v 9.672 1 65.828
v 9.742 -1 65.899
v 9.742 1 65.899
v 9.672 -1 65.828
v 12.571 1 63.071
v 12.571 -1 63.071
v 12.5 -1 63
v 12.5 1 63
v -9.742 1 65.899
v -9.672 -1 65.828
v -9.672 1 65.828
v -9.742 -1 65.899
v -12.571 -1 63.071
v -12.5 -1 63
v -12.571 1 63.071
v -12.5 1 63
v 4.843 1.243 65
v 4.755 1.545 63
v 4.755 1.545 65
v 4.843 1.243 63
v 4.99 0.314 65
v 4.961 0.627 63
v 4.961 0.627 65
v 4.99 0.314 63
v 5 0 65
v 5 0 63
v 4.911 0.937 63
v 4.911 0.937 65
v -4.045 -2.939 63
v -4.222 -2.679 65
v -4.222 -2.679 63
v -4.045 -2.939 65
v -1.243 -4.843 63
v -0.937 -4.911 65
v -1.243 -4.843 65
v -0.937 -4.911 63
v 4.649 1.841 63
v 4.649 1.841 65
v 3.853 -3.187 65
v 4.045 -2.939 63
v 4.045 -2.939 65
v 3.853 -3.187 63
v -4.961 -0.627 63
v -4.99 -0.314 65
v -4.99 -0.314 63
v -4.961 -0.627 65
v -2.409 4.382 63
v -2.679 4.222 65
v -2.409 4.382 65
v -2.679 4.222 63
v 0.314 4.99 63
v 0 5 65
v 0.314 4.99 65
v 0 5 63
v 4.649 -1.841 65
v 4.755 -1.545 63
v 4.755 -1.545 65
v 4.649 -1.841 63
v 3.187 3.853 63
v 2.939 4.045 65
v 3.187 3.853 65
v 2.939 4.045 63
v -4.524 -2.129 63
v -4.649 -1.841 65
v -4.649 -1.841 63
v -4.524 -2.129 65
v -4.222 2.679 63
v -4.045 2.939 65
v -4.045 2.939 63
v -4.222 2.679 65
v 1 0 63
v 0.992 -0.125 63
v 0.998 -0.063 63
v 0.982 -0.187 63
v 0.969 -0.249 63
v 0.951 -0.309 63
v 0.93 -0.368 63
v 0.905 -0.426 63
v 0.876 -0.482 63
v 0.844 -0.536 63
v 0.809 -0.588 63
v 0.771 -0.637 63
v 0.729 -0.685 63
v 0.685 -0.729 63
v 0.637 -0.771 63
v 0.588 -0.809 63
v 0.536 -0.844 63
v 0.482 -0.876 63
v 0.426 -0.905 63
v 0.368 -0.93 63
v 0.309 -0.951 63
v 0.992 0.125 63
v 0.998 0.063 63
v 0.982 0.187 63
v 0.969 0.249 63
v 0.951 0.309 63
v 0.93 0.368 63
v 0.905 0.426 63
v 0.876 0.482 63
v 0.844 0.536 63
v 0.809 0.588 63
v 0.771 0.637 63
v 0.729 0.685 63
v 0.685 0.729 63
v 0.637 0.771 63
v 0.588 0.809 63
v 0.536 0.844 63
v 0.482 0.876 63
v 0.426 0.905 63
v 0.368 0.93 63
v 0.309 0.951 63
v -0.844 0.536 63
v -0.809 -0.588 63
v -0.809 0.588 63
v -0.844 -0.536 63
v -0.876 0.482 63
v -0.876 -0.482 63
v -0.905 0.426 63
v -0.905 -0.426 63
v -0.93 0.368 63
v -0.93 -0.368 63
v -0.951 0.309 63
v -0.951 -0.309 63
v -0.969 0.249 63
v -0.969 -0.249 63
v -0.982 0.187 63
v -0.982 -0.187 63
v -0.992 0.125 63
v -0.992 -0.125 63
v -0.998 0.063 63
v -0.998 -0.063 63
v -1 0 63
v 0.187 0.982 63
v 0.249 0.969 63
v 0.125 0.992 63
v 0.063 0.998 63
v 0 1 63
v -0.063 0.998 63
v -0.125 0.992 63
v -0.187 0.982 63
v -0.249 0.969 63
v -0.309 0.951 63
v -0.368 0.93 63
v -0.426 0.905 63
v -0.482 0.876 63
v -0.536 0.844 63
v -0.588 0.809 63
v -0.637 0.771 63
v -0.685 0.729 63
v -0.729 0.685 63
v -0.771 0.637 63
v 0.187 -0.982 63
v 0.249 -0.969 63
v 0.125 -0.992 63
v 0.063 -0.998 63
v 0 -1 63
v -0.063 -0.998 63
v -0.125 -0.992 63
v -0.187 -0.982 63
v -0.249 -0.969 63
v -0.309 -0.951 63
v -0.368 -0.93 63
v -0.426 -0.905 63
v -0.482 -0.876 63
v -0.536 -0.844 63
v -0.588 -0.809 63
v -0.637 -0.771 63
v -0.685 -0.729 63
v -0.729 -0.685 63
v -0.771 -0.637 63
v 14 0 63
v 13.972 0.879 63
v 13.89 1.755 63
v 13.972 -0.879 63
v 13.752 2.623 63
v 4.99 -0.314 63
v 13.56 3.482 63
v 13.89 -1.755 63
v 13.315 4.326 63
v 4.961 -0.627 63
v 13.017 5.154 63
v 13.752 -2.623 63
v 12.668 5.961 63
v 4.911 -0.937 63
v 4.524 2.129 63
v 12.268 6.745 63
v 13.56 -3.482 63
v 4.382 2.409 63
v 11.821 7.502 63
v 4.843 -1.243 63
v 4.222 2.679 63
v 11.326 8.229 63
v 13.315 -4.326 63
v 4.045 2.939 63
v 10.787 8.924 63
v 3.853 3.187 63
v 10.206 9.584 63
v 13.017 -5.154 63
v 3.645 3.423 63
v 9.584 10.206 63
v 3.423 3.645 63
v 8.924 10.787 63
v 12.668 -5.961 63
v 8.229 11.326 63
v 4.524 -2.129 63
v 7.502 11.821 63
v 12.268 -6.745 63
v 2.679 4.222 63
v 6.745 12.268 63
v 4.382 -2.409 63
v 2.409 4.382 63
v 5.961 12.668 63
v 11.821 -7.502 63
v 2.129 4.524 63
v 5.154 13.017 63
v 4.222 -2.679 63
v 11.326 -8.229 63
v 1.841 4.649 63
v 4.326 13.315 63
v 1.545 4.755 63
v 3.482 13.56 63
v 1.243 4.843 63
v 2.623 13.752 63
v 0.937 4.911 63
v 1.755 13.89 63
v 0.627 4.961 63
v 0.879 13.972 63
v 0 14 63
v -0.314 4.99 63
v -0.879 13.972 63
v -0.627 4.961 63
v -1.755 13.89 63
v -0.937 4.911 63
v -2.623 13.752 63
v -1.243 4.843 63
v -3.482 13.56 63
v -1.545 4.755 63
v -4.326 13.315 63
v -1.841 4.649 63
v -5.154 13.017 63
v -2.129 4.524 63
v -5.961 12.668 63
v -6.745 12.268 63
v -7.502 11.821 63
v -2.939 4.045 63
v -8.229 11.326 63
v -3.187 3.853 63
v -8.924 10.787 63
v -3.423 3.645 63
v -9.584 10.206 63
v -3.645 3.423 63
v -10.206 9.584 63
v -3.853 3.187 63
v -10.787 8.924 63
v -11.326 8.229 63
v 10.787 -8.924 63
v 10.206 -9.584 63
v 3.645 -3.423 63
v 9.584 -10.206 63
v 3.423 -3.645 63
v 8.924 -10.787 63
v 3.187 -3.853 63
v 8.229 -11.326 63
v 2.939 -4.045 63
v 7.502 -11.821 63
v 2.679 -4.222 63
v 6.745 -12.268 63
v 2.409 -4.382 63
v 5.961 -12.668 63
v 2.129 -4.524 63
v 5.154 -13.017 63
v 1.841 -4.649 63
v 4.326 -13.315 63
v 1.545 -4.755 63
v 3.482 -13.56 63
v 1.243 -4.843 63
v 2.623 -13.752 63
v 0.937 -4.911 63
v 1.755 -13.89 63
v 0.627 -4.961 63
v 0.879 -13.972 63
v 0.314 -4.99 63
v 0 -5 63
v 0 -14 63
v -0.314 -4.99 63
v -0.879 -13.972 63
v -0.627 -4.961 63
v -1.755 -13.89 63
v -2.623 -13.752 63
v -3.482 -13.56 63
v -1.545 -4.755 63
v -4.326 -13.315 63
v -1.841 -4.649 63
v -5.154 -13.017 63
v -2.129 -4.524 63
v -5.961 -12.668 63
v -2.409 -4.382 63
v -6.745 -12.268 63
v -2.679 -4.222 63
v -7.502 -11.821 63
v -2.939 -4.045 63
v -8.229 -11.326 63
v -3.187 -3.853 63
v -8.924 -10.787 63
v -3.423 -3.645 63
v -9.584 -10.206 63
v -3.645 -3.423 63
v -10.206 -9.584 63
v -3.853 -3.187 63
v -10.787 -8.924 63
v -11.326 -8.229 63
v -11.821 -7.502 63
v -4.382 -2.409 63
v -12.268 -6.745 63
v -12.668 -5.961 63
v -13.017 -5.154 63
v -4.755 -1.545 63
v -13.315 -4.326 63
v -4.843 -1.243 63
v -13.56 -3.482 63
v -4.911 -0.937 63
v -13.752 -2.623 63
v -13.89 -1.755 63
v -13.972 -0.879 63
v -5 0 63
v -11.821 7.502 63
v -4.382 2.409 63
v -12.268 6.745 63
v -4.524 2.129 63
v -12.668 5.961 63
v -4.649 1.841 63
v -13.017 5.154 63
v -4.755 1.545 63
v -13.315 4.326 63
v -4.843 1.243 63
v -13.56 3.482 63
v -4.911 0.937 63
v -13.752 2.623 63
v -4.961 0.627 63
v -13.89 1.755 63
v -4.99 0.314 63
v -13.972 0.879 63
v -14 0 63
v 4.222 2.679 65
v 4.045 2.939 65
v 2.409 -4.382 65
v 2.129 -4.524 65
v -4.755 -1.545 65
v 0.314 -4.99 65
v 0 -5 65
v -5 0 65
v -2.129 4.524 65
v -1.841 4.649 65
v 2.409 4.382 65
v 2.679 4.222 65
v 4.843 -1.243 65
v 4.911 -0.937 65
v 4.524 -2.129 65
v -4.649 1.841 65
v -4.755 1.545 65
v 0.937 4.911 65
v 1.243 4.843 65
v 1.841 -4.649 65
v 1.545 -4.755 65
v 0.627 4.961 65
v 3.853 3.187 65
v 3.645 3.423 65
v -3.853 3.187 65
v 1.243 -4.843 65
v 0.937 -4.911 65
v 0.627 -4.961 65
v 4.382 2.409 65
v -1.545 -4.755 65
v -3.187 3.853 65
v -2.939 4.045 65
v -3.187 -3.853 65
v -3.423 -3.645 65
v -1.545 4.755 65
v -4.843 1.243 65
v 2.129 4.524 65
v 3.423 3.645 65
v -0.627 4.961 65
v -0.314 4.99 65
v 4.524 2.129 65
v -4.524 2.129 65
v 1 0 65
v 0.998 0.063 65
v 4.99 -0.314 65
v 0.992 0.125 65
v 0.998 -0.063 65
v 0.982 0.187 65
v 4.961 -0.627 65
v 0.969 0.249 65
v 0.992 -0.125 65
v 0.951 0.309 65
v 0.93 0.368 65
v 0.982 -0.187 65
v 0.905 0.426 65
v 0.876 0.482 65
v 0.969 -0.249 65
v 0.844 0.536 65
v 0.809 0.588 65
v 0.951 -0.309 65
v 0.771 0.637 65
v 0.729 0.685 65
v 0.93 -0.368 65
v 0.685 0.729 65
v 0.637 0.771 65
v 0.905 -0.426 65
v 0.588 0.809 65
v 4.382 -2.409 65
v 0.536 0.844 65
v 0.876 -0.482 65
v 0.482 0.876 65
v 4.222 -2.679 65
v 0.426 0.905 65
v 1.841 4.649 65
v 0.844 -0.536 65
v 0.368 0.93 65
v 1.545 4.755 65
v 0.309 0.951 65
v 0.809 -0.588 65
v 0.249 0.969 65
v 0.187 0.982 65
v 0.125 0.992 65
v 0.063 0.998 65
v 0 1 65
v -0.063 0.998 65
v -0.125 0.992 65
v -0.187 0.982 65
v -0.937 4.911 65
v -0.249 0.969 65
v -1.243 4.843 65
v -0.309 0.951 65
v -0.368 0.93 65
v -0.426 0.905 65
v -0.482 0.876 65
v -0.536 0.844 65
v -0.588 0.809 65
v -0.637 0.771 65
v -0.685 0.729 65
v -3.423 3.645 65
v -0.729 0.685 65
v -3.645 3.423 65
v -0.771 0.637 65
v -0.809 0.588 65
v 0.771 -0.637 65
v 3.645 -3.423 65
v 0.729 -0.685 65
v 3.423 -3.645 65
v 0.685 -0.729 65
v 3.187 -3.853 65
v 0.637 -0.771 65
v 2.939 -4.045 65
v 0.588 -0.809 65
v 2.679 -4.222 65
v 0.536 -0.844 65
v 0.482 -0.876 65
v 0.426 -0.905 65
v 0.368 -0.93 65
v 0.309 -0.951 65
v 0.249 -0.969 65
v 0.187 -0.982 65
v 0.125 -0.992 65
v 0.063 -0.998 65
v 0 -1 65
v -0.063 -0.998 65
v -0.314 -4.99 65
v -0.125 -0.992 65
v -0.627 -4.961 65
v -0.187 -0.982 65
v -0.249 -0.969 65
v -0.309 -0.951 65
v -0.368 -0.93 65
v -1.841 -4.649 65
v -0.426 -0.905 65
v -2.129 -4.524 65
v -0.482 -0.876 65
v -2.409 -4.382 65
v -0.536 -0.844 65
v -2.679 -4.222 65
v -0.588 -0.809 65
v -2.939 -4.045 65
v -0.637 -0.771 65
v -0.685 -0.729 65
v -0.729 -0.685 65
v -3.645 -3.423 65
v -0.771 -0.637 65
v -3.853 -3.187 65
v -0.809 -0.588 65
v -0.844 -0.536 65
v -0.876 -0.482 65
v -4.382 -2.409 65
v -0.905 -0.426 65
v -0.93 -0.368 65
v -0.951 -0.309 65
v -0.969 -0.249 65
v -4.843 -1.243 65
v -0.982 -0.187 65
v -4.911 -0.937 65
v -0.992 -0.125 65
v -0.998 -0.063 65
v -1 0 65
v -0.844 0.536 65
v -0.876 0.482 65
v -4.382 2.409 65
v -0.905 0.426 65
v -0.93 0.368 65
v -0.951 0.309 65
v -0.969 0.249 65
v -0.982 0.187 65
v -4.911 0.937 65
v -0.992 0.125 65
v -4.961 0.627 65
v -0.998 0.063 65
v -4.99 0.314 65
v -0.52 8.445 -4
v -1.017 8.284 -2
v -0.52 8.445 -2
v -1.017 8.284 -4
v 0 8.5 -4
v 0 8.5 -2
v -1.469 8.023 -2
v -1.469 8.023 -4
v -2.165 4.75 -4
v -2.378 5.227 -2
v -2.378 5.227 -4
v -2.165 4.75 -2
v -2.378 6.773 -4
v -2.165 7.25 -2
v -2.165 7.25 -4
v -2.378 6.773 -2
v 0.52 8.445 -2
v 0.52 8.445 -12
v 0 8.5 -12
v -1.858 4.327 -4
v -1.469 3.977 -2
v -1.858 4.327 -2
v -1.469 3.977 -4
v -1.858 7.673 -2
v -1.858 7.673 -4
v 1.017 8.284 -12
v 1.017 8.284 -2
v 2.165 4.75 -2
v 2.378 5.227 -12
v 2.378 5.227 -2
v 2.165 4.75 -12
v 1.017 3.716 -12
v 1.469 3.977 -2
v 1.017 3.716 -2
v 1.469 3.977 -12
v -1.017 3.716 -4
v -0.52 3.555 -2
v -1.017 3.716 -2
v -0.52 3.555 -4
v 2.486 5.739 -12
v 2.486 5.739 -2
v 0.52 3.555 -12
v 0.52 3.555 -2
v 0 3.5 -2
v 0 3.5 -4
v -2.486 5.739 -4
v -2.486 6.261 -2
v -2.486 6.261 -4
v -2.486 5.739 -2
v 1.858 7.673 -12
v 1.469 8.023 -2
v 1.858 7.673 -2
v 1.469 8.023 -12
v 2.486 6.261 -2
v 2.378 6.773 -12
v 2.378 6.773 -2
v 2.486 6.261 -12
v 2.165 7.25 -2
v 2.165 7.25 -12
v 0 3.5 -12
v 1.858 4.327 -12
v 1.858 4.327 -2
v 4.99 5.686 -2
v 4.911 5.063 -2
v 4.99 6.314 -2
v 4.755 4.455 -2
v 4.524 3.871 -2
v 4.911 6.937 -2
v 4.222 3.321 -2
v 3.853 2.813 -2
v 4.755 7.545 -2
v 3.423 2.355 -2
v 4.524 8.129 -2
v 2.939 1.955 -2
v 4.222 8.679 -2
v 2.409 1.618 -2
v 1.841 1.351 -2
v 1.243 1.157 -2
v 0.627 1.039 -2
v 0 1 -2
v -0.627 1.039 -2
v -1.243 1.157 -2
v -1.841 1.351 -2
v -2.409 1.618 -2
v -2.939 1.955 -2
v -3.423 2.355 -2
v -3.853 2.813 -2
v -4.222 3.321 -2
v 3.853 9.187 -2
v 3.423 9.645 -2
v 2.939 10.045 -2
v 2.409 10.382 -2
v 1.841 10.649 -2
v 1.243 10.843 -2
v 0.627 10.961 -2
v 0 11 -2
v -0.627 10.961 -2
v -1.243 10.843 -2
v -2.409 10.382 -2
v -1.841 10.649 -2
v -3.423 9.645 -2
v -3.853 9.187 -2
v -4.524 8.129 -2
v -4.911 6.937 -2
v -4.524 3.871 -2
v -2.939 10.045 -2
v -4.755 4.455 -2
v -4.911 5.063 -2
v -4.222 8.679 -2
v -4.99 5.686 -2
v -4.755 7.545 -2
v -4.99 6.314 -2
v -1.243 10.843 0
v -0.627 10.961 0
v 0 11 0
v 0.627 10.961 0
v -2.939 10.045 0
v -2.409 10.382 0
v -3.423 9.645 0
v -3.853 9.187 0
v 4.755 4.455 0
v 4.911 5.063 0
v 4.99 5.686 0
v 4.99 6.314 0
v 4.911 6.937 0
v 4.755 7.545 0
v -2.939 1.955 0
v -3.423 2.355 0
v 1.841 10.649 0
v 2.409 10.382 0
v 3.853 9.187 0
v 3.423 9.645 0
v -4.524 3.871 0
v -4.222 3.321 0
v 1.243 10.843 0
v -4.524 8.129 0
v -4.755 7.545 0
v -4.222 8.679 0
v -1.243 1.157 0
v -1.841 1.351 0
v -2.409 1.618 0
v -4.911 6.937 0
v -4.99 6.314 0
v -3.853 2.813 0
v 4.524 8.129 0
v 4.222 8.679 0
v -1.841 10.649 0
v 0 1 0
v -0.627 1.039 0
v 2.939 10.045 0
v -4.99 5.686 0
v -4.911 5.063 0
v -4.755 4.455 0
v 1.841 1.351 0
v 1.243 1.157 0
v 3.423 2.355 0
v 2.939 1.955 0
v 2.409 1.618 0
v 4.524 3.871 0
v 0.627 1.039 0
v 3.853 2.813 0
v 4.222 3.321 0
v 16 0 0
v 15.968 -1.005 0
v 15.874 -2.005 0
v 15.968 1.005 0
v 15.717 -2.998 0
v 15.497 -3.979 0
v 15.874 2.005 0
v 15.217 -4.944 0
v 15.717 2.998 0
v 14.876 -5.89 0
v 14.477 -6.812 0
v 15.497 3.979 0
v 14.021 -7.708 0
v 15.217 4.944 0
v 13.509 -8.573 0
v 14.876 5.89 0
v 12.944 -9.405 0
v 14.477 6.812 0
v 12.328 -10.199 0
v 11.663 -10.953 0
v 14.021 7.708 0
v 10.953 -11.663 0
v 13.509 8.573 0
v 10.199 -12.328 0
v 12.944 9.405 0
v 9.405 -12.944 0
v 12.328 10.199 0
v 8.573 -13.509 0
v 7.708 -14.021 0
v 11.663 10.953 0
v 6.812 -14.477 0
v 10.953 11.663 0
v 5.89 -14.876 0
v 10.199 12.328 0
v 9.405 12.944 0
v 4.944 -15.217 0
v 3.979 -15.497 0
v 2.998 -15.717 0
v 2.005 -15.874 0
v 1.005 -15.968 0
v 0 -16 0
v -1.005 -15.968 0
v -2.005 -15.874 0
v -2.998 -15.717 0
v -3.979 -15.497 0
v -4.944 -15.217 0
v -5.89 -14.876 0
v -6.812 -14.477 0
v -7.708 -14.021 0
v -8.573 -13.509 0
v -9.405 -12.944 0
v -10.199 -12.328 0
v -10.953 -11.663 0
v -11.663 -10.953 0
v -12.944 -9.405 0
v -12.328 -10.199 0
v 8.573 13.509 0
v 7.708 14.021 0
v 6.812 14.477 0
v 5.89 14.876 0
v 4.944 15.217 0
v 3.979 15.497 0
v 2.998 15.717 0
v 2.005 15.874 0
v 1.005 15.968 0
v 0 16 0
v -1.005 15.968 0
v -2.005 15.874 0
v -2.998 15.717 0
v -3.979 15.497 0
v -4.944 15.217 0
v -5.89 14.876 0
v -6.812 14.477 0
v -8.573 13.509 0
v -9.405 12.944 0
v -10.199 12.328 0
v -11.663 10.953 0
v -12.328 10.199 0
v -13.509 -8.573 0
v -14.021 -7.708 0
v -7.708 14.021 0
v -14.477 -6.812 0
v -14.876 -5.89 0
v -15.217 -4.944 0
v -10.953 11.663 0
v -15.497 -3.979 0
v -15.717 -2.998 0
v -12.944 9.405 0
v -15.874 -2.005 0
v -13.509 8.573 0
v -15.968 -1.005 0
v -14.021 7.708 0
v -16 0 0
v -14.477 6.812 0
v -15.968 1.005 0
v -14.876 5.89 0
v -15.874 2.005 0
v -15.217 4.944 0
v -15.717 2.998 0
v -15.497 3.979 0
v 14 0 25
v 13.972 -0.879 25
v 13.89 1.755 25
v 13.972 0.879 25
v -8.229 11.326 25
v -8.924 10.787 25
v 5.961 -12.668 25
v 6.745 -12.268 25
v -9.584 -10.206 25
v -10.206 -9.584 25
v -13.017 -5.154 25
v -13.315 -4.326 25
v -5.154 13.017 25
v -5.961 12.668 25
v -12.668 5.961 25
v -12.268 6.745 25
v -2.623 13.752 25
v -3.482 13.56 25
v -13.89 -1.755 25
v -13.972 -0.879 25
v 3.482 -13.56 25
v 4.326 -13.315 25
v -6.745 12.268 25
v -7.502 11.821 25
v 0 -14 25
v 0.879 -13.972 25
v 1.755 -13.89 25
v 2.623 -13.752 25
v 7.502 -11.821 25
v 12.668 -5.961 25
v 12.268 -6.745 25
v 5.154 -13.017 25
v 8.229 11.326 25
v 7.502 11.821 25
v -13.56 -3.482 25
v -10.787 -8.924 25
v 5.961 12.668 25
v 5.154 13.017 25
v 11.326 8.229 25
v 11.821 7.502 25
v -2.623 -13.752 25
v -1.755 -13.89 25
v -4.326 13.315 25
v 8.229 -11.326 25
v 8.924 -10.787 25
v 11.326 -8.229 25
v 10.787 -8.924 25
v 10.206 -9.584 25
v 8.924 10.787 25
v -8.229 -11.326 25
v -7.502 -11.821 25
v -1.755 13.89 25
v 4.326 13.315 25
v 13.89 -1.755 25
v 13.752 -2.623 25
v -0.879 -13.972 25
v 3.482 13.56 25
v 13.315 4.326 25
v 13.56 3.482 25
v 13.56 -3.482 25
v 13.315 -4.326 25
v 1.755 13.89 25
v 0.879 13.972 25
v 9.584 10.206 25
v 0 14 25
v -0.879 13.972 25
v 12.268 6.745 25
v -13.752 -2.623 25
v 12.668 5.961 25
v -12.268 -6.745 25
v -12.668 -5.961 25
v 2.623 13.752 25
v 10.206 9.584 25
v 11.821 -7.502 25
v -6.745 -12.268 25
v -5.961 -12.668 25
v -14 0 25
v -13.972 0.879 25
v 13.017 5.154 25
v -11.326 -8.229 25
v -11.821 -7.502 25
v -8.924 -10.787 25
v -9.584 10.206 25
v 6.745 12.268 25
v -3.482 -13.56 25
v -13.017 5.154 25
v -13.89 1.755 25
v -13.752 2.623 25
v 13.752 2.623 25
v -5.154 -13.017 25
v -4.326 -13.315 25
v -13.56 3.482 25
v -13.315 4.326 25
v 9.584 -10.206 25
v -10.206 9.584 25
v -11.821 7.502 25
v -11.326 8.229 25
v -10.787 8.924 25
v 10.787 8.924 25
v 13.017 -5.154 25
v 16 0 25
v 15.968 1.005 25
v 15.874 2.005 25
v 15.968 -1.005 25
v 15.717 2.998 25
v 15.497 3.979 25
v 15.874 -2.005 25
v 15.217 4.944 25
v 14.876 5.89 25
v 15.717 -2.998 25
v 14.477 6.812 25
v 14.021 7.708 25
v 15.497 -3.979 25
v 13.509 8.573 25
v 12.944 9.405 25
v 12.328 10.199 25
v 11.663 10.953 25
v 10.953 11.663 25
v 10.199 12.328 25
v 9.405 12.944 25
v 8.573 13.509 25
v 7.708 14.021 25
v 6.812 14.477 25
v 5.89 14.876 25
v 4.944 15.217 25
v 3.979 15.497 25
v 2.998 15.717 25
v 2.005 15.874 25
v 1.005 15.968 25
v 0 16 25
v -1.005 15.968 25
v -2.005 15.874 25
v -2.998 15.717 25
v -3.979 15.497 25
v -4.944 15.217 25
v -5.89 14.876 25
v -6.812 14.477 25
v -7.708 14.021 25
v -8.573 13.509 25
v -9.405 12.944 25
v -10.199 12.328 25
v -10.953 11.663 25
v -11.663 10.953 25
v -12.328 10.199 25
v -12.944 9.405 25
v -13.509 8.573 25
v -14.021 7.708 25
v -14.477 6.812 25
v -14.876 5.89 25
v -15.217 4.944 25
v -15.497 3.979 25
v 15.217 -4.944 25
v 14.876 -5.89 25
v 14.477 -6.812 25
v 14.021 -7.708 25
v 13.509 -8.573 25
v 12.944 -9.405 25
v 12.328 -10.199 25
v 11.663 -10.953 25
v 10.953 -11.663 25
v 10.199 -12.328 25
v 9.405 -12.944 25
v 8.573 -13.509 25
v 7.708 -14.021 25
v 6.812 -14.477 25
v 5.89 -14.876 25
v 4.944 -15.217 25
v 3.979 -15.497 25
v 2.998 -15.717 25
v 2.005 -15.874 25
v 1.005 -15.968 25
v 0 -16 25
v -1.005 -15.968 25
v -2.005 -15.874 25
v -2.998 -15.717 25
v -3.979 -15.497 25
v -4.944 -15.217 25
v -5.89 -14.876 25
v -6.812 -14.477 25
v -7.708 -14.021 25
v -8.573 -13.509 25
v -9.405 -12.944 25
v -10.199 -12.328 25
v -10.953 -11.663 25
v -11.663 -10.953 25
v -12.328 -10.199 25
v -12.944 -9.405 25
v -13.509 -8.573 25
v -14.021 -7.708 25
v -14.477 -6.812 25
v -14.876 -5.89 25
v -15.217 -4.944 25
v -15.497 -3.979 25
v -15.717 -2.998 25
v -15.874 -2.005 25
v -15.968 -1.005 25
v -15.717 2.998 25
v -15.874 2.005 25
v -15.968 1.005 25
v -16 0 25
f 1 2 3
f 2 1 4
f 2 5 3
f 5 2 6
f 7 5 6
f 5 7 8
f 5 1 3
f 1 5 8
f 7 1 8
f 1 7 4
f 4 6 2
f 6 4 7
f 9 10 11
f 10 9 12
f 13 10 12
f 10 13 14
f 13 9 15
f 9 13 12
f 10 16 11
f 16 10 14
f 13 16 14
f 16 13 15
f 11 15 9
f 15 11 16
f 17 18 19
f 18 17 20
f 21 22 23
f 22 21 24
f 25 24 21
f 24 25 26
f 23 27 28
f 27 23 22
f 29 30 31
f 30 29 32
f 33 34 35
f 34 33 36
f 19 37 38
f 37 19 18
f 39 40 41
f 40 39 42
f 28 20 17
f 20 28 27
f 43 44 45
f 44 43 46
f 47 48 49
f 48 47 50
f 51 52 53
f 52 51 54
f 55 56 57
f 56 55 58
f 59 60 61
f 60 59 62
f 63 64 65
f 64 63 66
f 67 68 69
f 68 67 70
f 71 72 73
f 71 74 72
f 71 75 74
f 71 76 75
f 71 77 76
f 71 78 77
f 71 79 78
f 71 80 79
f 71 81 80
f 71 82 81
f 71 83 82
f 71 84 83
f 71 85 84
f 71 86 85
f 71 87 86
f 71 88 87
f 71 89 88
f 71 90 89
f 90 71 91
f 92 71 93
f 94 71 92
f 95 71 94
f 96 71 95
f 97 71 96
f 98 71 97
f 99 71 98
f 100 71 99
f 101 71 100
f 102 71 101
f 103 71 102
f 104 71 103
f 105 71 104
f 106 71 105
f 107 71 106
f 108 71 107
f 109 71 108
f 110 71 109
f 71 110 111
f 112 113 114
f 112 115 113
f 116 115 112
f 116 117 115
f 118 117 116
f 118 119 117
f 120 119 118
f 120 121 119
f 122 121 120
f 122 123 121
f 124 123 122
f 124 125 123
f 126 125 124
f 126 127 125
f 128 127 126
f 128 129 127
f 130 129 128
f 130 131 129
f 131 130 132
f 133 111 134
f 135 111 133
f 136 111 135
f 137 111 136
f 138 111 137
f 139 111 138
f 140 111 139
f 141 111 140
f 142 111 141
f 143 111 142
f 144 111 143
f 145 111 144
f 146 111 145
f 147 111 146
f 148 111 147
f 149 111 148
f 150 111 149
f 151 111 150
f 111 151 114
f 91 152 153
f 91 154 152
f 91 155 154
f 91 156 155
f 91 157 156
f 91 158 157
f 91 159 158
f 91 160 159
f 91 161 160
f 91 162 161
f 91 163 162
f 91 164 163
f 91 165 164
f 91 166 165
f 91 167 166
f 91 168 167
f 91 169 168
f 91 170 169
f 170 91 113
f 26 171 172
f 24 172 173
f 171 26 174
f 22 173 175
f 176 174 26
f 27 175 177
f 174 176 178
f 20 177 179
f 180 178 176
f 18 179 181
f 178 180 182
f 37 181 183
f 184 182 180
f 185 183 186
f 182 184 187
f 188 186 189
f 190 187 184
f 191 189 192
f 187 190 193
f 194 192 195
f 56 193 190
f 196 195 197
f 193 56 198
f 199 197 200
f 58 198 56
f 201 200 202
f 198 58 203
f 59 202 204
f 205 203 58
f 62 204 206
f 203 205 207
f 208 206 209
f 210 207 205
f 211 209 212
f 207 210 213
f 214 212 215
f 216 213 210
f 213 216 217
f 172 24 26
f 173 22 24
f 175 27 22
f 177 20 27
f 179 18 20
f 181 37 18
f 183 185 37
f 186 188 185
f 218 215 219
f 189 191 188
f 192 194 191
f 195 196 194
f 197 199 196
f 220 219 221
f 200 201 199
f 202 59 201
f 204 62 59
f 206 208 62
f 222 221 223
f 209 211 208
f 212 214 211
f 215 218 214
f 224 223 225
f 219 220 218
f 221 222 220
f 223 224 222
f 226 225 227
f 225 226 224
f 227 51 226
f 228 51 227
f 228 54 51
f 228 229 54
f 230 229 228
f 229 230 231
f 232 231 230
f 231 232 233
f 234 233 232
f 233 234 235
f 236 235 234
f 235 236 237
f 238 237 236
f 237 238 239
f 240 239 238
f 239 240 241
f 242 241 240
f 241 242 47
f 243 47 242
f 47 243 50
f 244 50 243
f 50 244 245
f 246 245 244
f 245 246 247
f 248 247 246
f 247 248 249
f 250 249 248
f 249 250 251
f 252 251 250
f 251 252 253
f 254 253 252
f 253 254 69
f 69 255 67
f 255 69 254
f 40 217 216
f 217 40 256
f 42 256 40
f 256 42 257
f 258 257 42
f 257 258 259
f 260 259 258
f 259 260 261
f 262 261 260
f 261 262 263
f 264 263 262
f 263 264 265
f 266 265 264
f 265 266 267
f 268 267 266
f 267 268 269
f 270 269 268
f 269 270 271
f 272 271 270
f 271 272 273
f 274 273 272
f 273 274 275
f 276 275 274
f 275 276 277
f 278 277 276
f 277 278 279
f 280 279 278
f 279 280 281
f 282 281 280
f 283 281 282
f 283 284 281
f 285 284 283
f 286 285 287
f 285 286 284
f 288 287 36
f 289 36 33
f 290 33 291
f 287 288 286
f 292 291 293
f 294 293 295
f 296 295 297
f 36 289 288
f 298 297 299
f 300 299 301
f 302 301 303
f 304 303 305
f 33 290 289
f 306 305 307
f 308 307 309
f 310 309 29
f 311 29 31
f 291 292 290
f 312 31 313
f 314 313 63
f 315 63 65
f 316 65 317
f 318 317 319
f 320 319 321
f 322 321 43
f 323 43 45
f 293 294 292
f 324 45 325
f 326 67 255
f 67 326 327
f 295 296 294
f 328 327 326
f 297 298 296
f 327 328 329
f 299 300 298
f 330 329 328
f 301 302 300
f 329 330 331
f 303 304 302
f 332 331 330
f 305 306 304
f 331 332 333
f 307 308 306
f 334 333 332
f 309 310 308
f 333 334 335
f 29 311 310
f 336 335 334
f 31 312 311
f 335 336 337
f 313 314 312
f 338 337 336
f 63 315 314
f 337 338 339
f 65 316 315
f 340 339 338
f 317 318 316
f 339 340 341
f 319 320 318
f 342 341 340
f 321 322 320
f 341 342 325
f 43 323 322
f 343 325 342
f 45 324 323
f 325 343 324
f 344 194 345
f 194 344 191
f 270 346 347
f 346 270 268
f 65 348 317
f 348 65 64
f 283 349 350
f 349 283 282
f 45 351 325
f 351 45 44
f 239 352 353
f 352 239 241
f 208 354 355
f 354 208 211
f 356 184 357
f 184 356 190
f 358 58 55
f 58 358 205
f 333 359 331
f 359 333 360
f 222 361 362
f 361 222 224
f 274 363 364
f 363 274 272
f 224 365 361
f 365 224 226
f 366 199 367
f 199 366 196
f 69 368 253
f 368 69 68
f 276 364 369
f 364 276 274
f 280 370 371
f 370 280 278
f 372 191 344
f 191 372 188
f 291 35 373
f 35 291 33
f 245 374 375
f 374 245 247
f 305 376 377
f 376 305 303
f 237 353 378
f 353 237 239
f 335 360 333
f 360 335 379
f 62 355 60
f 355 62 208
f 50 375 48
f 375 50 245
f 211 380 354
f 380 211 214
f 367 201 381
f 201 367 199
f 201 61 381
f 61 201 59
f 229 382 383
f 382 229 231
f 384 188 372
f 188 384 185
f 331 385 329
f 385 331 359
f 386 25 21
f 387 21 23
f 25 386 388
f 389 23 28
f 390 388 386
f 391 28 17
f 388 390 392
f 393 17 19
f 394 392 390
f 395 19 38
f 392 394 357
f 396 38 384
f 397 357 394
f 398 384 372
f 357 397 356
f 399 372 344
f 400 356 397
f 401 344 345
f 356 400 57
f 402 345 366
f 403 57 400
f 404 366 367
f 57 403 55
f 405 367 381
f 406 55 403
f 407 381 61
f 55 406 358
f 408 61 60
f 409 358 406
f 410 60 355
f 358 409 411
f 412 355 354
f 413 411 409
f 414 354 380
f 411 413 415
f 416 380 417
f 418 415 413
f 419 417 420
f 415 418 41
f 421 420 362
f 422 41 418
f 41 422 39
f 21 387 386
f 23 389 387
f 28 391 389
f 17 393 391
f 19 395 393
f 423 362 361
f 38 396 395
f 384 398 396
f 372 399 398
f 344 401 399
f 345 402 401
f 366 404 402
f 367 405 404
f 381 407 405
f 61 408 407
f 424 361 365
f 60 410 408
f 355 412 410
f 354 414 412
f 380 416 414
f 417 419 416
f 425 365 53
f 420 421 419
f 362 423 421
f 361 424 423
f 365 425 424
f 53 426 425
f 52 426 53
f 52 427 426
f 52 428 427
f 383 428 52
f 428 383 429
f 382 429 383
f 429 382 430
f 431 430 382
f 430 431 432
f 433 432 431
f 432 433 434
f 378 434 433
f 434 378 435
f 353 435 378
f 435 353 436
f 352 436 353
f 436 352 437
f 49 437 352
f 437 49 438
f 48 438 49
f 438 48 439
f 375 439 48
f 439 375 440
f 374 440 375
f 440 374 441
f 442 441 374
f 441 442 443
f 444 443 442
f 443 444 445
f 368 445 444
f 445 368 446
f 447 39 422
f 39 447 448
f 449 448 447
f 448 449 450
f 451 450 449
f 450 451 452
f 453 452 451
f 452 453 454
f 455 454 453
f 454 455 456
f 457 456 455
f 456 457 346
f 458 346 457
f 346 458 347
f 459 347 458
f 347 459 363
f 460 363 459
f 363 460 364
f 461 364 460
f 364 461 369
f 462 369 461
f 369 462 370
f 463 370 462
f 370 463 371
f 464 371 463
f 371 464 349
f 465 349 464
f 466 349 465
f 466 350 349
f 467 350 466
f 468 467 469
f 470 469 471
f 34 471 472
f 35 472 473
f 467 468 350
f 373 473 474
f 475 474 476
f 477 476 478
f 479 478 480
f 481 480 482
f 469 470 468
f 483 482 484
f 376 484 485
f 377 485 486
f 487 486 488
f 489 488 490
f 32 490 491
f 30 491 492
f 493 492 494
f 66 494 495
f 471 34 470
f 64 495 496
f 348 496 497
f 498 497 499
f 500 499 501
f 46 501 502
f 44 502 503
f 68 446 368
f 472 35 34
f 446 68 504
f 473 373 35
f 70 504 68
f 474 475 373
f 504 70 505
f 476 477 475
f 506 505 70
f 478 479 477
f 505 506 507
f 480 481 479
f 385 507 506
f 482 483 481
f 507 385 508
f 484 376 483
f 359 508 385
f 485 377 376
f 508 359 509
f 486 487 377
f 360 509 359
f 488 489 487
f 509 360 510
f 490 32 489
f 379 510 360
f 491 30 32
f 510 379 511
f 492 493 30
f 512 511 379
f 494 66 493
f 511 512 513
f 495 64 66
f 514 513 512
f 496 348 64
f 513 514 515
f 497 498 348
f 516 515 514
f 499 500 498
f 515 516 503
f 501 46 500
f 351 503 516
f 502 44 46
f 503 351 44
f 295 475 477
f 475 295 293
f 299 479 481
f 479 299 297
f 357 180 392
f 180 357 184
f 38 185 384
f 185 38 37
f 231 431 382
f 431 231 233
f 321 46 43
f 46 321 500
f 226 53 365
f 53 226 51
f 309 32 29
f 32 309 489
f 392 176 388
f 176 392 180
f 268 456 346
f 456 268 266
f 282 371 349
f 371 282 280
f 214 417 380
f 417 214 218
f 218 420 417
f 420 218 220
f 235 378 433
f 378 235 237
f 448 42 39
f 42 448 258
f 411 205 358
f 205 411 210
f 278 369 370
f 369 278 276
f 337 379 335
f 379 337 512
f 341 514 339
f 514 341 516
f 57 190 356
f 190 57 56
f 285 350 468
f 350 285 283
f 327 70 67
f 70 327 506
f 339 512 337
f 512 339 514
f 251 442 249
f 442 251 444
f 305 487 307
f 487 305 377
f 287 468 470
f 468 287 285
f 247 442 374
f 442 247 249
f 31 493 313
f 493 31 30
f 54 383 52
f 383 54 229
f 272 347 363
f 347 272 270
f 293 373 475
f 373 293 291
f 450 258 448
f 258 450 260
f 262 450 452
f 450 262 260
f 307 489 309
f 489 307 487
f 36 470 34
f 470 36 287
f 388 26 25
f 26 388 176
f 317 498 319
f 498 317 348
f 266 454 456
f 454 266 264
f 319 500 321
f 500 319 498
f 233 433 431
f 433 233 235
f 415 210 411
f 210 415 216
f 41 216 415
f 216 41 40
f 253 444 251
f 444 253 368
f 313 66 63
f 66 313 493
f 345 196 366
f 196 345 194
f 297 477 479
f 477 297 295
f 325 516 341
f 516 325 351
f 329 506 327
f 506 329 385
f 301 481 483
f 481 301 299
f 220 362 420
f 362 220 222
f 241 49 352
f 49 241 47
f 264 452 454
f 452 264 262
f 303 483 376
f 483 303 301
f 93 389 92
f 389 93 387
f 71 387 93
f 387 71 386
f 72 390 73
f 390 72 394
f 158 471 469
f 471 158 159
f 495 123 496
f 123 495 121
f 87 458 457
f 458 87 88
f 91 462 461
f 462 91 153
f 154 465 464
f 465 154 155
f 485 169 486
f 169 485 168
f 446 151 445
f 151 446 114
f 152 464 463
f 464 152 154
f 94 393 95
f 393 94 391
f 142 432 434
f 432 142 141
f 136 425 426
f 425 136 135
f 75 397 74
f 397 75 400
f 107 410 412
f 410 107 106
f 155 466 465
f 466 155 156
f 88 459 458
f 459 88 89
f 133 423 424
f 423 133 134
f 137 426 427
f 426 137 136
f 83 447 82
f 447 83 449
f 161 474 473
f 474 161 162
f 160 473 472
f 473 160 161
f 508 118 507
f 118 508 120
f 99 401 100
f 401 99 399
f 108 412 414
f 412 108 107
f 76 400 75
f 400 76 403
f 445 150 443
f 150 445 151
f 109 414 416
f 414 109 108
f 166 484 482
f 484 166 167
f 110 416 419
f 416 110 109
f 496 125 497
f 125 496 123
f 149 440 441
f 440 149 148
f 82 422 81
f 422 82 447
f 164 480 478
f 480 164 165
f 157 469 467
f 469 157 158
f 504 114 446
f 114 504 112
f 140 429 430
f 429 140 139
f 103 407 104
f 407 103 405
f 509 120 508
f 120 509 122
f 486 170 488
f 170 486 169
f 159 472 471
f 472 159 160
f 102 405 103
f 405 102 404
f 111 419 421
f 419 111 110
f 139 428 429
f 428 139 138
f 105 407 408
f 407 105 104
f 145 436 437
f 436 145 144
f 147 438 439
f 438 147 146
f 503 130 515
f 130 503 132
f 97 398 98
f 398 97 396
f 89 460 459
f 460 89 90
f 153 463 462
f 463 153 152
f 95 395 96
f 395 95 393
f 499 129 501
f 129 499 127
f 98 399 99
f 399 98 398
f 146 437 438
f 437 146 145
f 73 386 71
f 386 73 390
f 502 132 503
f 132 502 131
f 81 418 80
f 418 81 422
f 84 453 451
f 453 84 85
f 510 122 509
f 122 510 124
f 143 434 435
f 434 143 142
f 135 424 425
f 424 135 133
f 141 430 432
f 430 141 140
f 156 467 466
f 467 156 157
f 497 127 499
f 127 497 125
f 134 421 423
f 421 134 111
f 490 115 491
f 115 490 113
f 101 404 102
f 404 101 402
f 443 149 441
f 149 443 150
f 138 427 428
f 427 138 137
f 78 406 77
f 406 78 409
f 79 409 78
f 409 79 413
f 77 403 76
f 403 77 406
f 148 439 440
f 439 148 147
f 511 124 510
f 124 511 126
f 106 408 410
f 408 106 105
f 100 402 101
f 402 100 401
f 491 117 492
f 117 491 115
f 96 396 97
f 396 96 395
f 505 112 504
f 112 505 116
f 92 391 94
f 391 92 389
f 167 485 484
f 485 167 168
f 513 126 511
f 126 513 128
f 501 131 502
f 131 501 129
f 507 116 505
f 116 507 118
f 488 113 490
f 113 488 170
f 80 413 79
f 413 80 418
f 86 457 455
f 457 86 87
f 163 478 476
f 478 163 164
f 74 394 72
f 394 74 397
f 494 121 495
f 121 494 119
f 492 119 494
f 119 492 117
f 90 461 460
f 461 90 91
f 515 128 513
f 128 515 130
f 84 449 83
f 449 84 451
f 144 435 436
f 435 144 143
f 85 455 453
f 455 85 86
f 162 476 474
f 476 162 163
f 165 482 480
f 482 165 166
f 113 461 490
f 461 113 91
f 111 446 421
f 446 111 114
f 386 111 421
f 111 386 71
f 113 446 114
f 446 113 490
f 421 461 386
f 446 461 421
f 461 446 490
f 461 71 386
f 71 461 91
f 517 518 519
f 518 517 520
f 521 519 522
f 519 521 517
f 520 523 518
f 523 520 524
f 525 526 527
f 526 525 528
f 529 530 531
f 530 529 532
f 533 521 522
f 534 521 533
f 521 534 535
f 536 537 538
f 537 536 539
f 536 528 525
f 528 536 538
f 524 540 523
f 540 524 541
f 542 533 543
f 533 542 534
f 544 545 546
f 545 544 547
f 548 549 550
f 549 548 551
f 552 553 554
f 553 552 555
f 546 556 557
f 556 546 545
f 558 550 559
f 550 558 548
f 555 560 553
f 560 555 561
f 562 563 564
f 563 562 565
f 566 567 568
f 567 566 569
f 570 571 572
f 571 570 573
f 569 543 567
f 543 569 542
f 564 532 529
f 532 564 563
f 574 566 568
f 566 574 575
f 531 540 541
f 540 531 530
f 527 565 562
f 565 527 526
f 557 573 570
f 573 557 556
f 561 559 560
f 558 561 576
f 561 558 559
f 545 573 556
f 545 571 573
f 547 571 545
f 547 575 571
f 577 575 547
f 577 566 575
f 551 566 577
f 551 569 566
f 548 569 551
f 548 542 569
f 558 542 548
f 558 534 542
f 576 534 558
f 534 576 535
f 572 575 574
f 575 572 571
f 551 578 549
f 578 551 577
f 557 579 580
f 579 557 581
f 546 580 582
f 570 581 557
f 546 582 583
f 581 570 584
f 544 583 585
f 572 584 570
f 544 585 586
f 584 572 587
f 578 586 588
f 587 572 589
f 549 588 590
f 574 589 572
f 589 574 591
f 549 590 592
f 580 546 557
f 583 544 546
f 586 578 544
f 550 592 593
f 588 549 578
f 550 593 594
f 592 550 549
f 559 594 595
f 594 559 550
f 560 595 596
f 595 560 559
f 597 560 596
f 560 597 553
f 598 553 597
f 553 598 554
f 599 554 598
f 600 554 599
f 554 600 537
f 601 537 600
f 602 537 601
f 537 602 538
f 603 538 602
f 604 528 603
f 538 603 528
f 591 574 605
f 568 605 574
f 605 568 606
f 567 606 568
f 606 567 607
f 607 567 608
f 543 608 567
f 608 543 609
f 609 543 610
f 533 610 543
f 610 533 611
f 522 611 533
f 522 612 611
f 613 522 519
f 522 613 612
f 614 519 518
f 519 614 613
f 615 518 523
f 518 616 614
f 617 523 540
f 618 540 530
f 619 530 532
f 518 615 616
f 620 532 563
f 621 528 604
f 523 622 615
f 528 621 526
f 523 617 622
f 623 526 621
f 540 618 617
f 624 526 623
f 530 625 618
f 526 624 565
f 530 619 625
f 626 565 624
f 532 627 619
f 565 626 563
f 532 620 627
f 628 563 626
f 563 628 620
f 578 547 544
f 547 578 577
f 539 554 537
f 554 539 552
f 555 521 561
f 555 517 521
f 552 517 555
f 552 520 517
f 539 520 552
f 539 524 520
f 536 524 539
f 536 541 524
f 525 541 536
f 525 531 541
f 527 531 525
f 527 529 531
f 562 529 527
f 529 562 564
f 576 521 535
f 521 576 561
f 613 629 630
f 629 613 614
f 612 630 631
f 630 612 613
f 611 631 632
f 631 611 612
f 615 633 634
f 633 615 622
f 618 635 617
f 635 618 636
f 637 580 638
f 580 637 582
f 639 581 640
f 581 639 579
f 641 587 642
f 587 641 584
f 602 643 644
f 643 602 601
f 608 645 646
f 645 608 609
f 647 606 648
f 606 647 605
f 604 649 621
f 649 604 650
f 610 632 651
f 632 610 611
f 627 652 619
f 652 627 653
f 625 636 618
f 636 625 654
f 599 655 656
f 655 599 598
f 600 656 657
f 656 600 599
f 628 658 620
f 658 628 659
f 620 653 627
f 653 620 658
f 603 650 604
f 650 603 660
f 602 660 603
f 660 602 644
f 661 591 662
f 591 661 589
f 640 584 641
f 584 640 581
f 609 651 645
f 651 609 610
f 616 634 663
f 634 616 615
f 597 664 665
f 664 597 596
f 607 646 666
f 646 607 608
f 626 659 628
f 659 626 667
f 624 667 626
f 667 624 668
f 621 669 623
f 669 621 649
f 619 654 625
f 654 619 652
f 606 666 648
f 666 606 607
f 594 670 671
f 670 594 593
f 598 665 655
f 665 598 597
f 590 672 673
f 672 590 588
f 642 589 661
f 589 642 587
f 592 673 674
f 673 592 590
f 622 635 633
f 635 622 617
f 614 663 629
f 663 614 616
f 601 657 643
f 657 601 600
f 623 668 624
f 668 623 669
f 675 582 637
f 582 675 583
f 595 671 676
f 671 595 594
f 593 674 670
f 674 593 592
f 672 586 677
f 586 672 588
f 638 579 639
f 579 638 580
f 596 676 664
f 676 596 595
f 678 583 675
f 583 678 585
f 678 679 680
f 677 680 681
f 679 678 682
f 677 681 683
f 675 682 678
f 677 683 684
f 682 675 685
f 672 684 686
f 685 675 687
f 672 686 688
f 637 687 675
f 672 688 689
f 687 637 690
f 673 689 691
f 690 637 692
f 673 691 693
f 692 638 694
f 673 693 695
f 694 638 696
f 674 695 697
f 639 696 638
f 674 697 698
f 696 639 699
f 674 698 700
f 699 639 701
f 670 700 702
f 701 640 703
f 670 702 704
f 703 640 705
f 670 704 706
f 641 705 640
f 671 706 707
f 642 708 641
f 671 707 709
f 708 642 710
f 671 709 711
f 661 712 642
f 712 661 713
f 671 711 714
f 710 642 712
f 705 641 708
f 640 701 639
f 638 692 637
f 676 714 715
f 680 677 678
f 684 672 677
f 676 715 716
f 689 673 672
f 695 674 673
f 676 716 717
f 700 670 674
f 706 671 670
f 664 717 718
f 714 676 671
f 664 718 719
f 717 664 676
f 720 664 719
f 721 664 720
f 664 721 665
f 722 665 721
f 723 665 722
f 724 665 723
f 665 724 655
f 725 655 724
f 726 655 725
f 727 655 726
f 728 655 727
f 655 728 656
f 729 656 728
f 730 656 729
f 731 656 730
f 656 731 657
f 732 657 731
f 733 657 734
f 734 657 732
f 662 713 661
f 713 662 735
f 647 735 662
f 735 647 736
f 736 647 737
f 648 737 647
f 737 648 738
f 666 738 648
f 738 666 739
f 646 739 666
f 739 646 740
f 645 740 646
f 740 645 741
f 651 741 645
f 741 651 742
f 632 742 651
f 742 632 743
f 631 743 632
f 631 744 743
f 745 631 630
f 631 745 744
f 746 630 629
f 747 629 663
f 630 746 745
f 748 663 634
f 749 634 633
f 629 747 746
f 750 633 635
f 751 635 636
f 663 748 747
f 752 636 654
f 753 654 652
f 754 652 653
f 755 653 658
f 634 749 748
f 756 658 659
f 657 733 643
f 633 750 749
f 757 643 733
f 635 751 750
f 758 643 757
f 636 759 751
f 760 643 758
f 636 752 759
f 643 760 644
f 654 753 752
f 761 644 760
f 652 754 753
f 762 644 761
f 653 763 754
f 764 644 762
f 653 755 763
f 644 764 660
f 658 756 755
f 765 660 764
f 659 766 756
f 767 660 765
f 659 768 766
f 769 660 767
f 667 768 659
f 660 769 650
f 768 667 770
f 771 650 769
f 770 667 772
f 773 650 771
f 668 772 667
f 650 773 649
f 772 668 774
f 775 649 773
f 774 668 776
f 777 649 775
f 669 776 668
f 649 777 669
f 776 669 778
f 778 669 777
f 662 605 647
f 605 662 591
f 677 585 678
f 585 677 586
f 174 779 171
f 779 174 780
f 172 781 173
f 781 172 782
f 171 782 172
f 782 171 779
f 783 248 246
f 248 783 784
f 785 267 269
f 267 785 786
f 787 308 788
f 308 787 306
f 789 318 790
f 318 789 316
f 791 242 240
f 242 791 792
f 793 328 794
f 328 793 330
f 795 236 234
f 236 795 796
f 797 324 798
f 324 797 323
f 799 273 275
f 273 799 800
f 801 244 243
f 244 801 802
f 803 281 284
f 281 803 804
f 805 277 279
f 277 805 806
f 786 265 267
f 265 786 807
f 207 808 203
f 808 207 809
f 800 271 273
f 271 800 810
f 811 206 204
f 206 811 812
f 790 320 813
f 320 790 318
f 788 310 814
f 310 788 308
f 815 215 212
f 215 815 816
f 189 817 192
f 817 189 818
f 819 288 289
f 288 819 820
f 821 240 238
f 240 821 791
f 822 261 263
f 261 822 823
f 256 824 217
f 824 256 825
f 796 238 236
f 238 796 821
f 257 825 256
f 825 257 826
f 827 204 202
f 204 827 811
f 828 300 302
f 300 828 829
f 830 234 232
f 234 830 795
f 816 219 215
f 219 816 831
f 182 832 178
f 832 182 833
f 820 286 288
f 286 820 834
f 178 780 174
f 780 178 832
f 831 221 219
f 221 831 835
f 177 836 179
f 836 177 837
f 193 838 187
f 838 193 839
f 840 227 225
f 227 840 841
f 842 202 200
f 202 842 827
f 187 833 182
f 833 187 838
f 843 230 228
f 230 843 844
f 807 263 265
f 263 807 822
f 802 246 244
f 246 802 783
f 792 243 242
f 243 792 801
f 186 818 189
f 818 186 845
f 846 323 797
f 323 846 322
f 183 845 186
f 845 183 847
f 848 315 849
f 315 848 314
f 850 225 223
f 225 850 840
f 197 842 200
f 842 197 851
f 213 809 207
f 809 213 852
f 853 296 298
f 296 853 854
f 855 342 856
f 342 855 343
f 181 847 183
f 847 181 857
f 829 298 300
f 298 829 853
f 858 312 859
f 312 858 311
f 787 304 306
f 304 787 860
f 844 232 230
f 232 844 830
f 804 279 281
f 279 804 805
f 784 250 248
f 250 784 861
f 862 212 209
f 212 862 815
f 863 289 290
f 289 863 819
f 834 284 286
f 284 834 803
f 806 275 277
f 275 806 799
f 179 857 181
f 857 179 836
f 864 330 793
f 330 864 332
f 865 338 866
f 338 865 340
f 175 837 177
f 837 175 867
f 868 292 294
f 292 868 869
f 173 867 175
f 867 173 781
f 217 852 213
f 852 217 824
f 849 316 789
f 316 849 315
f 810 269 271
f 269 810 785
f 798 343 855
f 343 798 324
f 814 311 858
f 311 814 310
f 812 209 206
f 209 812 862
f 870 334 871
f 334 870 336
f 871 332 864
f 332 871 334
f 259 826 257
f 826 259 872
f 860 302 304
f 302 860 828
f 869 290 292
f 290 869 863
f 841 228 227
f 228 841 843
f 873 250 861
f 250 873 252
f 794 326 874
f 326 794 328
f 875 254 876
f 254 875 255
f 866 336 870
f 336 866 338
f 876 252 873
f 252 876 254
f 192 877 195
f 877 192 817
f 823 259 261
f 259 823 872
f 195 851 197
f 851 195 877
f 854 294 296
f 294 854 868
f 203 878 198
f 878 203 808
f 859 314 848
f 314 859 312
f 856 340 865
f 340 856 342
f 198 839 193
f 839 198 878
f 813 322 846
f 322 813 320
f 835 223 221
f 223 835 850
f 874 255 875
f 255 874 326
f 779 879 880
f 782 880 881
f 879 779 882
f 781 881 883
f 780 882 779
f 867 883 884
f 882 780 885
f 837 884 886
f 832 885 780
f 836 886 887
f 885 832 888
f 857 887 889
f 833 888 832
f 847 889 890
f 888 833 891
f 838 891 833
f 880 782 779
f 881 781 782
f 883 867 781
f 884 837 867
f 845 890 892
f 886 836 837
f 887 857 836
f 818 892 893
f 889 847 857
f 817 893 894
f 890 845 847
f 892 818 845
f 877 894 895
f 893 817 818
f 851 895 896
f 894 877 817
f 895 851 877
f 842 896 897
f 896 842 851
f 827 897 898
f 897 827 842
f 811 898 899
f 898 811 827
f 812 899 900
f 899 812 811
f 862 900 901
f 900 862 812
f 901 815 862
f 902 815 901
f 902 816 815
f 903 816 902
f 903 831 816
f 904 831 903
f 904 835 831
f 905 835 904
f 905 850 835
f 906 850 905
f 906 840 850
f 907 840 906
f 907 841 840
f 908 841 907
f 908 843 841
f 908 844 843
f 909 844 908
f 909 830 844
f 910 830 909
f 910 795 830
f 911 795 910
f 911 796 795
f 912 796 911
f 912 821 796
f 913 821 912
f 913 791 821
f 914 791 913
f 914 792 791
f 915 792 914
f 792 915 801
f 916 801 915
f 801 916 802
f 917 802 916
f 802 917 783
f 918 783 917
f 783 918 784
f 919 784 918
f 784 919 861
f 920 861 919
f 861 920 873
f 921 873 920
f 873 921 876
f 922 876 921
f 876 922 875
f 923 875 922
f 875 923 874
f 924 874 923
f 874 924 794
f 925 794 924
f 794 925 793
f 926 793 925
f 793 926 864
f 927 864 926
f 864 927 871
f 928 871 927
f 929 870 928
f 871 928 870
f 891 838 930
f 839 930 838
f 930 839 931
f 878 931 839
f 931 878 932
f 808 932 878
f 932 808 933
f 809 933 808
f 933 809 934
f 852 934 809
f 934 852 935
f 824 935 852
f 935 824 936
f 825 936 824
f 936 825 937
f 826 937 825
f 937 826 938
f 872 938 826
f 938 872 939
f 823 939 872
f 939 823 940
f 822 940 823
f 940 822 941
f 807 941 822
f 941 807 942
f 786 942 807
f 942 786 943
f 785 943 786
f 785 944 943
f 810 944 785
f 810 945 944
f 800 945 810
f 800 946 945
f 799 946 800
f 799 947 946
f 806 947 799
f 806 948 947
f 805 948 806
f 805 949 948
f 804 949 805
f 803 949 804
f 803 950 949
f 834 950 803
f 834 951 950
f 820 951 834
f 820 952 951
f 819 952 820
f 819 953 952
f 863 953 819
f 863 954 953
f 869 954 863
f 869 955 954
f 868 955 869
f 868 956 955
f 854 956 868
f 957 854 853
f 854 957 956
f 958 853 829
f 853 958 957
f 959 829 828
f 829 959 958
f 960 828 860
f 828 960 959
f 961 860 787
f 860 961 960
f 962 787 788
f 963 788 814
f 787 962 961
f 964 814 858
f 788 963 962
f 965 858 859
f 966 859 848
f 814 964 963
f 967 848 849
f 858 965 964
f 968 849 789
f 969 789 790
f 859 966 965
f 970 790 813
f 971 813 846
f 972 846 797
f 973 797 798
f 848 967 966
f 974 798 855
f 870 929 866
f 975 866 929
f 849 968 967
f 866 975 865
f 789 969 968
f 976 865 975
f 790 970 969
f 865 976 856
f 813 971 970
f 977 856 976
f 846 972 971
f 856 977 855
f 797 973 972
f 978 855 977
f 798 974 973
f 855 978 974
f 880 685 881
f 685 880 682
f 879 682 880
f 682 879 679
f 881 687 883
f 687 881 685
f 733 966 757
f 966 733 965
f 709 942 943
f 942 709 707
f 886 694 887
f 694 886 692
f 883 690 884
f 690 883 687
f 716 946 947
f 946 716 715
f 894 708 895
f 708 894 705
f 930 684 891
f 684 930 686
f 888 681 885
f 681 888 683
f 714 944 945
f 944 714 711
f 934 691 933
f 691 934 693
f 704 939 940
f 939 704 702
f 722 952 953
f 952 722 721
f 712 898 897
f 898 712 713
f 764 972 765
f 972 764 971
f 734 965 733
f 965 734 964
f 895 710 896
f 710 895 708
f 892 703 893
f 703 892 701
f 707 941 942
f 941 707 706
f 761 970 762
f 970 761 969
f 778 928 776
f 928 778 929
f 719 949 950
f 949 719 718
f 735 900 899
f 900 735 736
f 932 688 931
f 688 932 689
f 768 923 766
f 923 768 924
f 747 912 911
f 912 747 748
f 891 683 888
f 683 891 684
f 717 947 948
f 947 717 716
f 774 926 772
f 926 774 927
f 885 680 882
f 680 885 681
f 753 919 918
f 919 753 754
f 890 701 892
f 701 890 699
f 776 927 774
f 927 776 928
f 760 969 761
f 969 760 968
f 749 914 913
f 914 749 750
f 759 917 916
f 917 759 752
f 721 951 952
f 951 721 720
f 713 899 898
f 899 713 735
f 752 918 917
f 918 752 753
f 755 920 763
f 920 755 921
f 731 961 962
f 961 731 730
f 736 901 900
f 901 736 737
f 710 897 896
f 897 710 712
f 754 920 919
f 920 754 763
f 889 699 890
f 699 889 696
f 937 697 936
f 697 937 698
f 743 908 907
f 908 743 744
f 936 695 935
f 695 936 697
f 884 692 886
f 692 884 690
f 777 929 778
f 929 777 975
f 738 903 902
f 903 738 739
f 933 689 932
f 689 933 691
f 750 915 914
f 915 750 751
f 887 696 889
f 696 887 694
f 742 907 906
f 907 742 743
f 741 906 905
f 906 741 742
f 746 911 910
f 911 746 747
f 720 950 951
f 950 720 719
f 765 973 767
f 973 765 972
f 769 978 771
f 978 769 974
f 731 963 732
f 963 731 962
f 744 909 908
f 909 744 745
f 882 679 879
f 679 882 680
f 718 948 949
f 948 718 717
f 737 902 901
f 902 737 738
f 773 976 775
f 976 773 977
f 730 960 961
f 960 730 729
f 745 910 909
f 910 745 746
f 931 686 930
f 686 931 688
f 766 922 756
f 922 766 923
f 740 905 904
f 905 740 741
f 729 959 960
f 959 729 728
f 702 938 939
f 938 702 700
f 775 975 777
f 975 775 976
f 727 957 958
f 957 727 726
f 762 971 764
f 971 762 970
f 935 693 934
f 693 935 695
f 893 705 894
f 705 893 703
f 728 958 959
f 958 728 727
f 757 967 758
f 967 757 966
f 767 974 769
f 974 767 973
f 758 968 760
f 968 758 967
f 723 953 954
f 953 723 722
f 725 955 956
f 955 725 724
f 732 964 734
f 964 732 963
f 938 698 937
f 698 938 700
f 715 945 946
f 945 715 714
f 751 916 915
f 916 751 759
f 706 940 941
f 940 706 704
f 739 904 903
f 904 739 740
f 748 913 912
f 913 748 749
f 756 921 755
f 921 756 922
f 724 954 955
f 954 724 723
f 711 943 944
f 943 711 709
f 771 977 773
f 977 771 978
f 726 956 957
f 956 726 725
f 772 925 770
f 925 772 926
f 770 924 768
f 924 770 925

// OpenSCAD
// file: bagues.scad
module bague_pleine(diametre, epaisseur) {
    cylinder(h=epaisseur, d=diametre, $fn=100);
}

module bague_creuse(d_e, d_i, epaisseur) {
    assert(d_e > d_i, "diametre extérieur doit être plus grand que diametre intérieur")
    difference() {
        cylinder(h=epaisseur, d=d_e);
        translate([0,0,-1]) cylinder(h=epaisseur+2, d=d_i);
    }
}

module bague_creuse_2(d_e, d_i, dec, epaisseur) {
    assert(d_e > d_i, "diametre extérieur doit être plus grand que diametre intérieur")
    difference() {
        cylinder(h=epaisseur, d=d_e);
        translate([dec,0,-1]) cylinder(h=epaisseur+2, d=d_i);
    }
}
// main file
use <bagues.scad>;

module diode(d=5) {
    translate([0,0,d]) 
    sphere(d=d, $fn=100);
    cylinder(d=d,h=d, $fn=100);
}
// diode();

module interrupteur(state="ON"){
    largeure  = 8;
    longueure = 14;
    hauteur   = 10;
    translate([0,0,5])
    union() {
        color("blue")
        cube(size=[largeure, longueure, hauteur], center=true);
        
        color("grey")
        translate([0, 0, hauteur/2-0.1]) 
        cube(size=[largeure+0.2, longueure+0.2, 0.4], center=true);
        
        color("grey")
        translate([0, 0, 2.6])
        cube(size=[largeure+0.2, longueure-1, 5], center=true);
        
        color("grey")
        translate([0,0,5]) 
        cylinder(d=4,h=1,$fn=30);
        
        translate([0,0,5])
        if (state=="ON"){
            rotate([30,0,0])
            union() {
                hauteur=6;
                diametre=2.5;
                color("grey")
                cylinder(d=diametre,h=hauteur,$fn=30);
                color("grey")
                translate([0,0,hauteur]) 
                sphere(d=diametre,$fn=30);
            }
        }else{
            rotate([-30,0,0])
            union() {
                hauteur=6;
                diametre=2.5;
                color("grey")
                cylinder(d=diametre,h=hauteur,$fn=30);
                color("grey")
                translate([0,0,hauteur]) 
                sphere(d=diametre,$fn=30);
            }
        }
    }
}
// interrupteur("ON");

module moteur_1(){
    for (i=[0:1:1]) {
        color("grey")
        rotate([0,0,i*180]) 
        translate([28/2-1.5, -1, 35+25+3])
        rotate([0,-45,0]) 
        cube(size=[0.1,2,4]);
    }
    
    translate([0, 0, 35+25+3])
    union(){
        color(c=[0.2,0.2,0.2,1])
        bague_creuse(d_e=10, d_i=2, epaisseur=2, $fn=100);
        color("grey")
        cylinder(d=2, h=2);
    }
    
    color(c=[0.2,0.2,0.2,1])
    translate([0, 0, 35+25])
    cylinder(d=28, h=3, $fn=100);
    
    color("DarkKhaki")
    translate([0, 0, 25])
    cylinder(d=28, h=35, $fn=100);
    
    color("Gray")
    translate([0, 0, 0])
    cylinder(d=32, h=25, $fn=100);
    
    rotate([0,0,90]) 
    translate([32/2-5-10/2, 0, -2])
    union() {
        color("Gray")
        cylinder(d=10, h=2, $fn=50);
        color("lightGray")
        translate([0,0,-10])
        difference(){
            cylinder(d=5, h=10, $fn=30);
            translate([0,5/2,2]) 
            cube(size=[6,5,12], center=true);
        }
    }
}
moteur_1();
